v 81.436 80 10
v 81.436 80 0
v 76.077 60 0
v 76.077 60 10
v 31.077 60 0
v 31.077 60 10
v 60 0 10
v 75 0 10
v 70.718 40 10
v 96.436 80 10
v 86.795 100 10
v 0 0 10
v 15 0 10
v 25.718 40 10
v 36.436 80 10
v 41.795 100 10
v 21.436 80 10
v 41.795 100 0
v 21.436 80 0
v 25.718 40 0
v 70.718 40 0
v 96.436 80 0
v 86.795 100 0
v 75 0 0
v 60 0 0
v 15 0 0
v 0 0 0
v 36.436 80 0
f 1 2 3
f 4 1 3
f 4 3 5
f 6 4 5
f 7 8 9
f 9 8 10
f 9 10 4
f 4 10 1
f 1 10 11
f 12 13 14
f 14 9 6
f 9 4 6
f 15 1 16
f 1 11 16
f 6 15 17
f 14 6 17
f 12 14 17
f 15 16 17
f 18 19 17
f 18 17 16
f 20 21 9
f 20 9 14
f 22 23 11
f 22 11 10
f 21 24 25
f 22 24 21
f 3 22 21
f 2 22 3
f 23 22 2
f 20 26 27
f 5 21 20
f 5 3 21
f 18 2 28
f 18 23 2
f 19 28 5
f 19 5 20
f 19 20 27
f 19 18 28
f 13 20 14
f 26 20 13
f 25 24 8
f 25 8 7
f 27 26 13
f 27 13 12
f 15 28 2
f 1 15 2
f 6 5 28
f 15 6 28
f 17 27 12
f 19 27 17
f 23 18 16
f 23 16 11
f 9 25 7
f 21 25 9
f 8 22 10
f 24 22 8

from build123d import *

# Parameters (mm, degrees)
EXTRUDE_A_DEPTH = 10


with BuildPart() as part:
    # Skica5 → A_ (new body)
    with BuildSketch(Plane.XY):
        Polygon((0, 0), (21.435935394, 80), (41.794919243, 100), (86.794919243, 100), (96.435935394, 80), (75, 0), (60, 0), (70.717967697, 40), (25.717967697, 40), (15, 0), align=None)
        Polygon((36.435935394, 80), (81.435935394, 80), (76.076951546, 60), (31.076951546, 60), align=None, mode=Mode.SUBTRACT)
    extrude(amount=EXTRUDE_A_DEPTH)


solid = part.part
